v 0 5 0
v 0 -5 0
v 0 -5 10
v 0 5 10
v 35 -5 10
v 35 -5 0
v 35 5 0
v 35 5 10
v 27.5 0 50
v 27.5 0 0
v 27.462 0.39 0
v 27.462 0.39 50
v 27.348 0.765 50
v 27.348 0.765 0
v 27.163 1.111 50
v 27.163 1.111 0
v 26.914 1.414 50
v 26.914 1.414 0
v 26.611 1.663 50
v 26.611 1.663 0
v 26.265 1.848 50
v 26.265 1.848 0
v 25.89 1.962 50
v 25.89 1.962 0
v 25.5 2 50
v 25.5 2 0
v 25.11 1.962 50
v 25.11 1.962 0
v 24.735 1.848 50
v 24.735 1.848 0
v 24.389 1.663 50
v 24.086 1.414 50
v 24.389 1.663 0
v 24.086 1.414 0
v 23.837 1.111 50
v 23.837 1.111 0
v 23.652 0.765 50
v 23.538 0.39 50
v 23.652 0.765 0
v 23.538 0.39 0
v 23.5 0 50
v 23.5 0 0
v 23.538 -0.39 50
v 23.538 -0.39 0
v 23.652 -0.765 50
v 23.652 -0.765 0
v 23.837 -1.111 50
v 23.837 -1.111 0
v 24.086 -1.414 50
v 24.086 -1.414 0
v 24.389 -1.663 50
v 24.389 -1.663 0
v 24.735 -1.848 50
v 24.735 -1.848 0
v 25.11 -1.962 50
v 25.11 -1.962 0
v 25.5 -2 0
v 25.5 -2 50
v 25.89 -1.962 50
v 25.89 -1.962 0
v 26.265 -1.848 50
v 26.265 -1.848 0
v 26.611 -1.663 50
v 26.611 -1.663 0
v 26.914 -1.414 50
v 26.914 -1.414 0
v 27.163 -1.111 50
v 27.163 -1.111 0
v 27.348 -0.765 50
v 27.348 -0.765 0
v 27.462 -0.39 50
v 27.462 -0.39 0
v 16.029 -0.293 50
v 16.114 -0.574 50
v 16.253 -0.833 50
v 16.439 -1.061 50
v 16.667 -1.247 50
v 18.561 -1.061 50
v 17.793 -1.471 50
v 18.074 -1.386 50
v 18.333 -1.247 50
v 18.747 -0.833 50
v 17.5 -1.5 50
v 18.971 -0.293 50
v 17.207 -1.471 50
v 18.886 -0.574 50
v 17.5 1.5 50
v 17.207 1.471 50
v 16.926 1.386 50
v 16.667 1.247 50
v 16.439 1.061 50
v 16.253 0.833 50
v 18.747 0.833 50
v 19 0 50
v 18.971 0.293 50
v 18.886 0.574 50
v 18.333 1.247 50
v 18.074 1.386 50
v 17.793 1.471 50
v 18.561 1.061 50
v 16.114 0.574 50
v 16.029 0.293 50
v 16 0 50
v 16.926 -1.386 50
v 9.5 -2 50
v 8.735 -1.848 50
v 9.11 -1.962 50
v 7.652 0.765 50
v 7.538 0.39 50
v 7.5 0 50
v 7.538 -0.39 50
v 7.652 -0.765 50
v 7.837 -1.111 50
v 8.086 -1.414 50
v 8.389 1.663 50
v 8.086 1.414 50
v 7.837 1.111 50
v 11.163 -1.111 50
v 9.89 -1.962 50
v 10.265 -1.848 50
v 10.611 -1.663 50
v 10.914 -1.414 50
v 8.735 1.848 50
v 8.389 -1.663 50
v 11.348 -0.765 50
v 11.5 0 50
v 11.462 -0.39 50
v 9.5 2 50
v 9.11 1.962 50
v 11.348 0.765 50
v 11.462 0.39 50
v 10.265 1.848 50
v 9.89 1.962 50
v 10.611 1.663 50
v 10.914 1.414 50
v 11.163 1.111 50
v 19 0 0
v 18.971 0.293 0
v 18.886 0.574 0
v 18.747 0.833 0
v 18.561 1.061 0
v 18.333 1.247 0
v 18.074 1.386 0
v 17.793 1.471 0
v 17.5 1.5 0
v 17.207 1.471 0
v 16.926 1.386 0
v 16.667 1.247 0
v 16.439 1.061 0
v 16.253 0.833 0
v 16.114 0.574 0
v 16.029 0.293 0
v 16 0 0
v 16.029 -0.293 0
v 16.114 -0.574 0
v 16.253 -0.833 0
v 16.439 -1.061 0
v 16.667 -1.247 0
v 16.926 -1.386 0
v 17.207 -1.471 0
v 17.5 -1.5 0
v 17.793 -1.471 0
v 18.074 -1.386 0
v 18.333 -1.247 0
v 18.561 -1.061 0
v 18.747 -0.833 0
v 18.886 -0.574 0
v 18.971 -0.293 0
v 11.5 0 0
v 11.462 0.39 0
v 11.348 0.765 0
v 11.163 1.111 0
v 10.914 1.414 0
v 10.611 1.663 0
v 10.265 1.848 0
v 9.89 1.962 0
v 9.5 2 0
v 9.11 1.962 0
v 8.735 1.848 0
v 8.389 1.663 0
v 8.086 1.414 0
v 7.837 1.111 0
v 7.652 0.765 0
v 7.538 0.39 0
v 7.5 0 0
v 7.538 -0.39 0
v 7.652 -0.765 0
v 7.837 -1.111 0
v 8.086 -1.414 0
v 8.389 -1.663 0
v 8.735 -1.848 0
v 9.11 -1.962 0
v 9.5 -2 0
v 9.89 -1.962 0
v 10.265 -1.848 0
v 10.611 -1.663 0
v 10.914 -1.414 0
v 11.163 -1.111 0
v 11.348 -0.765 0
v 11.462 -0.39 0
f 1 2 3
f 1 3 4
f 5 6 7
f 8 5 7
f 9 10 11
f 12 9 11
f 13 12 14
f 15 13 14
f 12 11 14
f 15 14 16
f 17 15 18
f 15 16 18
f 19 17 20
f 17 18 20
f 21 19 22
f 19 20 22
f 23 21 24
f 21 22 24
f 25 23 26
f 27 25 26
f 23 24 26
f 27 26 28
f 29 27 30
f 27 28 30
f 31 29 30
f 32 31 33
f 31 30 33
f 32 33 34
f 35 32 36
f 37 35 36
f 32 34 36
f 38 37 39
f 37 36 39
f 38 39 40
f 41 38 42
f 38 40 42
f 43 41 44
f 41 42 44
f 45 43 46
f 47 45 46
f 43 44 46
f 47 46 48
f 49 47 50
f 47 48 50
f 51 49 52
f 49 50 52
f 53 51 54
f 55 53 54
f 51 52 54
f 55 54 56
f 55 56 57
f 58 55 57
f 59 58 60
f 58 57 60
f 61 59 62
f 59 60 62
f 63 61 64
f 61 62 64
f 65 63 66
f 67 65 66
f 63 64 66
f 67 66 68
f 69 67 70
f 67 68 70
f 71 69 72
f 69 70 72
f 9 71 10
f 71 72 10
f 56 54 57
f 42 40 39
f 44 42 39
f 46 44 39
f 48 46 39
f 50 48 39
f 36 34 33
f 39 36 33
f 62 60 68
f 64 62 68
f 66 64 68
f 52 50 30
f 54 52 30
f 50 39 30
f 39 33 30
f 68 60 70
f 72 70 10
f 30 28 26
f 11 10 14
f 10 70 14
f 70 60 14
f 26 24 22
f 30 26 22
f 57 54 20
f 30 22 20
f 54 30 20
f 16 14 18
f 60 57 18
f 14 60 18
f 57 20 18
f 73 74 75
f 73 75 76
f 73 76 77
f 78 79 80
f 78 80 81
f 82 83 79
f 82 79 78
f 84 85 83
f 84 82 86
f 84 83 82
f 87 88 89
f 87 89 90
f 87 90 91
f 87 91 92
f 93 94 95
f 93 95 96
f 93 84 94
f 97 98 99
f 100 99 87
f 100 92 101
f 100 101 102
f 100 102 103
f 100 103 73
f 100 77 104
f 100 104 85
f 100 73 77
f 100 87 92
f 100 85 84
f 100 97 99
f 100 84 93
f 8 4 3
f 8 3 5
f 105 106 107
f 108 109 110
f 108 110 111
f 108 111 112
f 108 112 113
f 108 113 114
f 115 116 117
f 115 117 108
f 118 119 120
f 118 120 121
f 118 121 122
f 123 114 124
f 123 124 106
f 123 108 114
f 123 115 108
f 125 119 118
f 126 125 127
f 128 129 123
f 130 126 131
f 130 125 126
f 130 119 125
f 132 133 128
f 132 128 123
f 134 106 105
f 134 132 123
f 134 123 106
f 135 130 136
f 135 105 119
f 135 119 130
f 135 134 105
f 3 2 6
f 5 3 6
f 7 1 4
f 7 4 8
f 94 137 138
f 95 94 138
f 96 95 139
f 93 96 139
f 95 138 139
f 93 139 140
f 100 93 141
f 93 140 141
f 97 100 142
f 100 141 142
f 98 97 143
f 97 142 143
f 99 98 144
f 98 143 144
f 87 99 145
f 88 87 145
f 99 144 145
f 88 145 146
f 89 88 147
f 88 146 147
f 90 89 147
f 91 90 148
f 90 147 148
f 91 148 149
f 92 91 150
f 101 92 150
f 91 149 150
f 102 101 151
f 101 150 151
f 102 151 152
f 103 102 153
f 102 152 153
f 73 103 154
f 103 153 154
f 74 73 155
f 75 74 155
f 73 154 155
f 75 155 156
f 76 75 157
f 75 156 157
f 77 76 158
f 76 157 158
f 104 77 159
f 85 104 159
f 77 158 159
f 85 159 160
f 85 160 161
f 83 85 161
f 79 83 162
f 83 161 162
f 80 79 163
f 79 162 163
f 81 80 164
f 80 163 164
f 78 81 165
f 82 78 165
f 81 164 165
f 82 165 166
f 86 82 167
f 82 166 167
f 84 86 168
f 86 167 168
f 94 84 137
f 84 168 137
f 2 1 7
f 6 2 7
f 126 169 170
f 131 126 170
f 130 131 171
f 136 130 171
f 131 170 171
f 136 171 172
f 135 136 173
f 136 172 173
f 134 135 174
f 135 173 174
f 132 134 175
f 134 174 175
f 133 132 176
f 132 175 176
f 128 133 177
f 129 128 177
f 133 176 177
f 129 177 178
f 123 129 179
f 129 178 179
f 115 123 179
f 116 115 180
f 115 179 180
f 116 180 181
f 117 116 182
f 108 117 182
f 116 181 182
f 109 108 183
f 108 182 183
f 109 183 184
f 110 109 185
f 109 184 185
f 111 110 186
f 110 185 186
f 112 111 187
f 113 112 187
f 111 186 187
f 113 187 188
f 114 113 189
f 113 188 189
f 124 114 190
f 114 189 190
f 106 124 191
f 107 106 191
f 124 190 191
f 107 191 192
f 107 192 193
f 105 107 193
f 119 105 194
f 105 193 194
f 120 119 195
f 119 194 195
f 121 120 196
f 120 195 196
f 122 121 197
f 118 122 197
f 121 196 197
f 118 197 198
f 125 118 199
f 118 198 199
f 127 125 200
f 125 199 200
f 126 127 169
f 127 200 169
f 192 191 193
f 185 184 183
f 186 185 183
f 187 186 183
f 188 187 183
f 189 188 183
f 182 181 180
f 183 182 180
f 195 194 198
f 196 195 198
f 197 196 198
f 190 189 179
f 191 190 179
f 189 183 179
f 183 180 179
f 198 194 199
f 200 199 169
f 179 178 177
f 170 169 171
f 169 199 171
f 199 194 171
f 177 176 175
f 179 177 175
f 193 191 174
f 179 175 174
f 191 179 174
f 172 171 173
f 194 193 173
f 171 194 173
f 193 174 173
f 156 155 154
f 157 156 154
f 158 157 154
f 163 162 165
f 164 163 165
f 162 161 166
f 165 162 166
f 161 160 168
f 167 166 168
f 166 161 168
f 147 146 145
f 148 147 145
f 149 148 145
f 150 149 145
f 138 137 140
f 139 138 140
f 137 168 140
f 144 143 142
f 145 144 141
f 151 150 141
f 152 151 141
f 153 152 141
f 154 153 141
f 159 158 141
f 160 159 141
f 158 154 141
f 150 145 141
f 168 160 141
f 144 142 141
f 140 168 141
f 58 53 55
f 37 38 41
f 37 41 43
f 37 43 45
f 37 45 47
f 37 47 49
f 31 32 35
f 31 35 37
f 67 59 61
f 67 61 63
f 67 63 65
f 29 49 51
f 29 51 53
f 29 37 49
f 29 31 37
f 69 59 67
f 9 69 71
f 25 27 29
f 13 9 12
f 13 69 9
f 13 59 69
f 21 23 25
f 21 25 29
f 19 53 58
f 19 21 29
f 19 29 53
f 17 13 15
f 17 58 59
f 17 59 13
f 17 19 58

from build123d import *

# Parameters (mm, degrees)
F0_R     = 2
F0_R_2   = 1.5
F1_DEPTH = 50
F2_W     = 35
F2_H     = 10
F3_DEPTH = 10


with BuildPart() as f1:
    # F0 (on Top) → F1 (new body)
    with BuildSketch(Plane.XY):
        with Locations((9.5, 0)):
            Circle(F0_R)
        with Locations((17.5, 0)):
            Circle(F0_R_2)
        with Locations((25.5, 0)):
            Circle(F0_R)
    extrude(amount=F1_DEPTH)


with BuildPart() as f3:
    # F2 (on Top) → F3 (new body)
    with BuildSketch(Plane.XY):
        with Locations((17.5, 0)):
            Rectangle(F2_W, F2_H)
    extrude(amount=F3_DEPTH)


solid = Compound([f1.part, f3.part])
